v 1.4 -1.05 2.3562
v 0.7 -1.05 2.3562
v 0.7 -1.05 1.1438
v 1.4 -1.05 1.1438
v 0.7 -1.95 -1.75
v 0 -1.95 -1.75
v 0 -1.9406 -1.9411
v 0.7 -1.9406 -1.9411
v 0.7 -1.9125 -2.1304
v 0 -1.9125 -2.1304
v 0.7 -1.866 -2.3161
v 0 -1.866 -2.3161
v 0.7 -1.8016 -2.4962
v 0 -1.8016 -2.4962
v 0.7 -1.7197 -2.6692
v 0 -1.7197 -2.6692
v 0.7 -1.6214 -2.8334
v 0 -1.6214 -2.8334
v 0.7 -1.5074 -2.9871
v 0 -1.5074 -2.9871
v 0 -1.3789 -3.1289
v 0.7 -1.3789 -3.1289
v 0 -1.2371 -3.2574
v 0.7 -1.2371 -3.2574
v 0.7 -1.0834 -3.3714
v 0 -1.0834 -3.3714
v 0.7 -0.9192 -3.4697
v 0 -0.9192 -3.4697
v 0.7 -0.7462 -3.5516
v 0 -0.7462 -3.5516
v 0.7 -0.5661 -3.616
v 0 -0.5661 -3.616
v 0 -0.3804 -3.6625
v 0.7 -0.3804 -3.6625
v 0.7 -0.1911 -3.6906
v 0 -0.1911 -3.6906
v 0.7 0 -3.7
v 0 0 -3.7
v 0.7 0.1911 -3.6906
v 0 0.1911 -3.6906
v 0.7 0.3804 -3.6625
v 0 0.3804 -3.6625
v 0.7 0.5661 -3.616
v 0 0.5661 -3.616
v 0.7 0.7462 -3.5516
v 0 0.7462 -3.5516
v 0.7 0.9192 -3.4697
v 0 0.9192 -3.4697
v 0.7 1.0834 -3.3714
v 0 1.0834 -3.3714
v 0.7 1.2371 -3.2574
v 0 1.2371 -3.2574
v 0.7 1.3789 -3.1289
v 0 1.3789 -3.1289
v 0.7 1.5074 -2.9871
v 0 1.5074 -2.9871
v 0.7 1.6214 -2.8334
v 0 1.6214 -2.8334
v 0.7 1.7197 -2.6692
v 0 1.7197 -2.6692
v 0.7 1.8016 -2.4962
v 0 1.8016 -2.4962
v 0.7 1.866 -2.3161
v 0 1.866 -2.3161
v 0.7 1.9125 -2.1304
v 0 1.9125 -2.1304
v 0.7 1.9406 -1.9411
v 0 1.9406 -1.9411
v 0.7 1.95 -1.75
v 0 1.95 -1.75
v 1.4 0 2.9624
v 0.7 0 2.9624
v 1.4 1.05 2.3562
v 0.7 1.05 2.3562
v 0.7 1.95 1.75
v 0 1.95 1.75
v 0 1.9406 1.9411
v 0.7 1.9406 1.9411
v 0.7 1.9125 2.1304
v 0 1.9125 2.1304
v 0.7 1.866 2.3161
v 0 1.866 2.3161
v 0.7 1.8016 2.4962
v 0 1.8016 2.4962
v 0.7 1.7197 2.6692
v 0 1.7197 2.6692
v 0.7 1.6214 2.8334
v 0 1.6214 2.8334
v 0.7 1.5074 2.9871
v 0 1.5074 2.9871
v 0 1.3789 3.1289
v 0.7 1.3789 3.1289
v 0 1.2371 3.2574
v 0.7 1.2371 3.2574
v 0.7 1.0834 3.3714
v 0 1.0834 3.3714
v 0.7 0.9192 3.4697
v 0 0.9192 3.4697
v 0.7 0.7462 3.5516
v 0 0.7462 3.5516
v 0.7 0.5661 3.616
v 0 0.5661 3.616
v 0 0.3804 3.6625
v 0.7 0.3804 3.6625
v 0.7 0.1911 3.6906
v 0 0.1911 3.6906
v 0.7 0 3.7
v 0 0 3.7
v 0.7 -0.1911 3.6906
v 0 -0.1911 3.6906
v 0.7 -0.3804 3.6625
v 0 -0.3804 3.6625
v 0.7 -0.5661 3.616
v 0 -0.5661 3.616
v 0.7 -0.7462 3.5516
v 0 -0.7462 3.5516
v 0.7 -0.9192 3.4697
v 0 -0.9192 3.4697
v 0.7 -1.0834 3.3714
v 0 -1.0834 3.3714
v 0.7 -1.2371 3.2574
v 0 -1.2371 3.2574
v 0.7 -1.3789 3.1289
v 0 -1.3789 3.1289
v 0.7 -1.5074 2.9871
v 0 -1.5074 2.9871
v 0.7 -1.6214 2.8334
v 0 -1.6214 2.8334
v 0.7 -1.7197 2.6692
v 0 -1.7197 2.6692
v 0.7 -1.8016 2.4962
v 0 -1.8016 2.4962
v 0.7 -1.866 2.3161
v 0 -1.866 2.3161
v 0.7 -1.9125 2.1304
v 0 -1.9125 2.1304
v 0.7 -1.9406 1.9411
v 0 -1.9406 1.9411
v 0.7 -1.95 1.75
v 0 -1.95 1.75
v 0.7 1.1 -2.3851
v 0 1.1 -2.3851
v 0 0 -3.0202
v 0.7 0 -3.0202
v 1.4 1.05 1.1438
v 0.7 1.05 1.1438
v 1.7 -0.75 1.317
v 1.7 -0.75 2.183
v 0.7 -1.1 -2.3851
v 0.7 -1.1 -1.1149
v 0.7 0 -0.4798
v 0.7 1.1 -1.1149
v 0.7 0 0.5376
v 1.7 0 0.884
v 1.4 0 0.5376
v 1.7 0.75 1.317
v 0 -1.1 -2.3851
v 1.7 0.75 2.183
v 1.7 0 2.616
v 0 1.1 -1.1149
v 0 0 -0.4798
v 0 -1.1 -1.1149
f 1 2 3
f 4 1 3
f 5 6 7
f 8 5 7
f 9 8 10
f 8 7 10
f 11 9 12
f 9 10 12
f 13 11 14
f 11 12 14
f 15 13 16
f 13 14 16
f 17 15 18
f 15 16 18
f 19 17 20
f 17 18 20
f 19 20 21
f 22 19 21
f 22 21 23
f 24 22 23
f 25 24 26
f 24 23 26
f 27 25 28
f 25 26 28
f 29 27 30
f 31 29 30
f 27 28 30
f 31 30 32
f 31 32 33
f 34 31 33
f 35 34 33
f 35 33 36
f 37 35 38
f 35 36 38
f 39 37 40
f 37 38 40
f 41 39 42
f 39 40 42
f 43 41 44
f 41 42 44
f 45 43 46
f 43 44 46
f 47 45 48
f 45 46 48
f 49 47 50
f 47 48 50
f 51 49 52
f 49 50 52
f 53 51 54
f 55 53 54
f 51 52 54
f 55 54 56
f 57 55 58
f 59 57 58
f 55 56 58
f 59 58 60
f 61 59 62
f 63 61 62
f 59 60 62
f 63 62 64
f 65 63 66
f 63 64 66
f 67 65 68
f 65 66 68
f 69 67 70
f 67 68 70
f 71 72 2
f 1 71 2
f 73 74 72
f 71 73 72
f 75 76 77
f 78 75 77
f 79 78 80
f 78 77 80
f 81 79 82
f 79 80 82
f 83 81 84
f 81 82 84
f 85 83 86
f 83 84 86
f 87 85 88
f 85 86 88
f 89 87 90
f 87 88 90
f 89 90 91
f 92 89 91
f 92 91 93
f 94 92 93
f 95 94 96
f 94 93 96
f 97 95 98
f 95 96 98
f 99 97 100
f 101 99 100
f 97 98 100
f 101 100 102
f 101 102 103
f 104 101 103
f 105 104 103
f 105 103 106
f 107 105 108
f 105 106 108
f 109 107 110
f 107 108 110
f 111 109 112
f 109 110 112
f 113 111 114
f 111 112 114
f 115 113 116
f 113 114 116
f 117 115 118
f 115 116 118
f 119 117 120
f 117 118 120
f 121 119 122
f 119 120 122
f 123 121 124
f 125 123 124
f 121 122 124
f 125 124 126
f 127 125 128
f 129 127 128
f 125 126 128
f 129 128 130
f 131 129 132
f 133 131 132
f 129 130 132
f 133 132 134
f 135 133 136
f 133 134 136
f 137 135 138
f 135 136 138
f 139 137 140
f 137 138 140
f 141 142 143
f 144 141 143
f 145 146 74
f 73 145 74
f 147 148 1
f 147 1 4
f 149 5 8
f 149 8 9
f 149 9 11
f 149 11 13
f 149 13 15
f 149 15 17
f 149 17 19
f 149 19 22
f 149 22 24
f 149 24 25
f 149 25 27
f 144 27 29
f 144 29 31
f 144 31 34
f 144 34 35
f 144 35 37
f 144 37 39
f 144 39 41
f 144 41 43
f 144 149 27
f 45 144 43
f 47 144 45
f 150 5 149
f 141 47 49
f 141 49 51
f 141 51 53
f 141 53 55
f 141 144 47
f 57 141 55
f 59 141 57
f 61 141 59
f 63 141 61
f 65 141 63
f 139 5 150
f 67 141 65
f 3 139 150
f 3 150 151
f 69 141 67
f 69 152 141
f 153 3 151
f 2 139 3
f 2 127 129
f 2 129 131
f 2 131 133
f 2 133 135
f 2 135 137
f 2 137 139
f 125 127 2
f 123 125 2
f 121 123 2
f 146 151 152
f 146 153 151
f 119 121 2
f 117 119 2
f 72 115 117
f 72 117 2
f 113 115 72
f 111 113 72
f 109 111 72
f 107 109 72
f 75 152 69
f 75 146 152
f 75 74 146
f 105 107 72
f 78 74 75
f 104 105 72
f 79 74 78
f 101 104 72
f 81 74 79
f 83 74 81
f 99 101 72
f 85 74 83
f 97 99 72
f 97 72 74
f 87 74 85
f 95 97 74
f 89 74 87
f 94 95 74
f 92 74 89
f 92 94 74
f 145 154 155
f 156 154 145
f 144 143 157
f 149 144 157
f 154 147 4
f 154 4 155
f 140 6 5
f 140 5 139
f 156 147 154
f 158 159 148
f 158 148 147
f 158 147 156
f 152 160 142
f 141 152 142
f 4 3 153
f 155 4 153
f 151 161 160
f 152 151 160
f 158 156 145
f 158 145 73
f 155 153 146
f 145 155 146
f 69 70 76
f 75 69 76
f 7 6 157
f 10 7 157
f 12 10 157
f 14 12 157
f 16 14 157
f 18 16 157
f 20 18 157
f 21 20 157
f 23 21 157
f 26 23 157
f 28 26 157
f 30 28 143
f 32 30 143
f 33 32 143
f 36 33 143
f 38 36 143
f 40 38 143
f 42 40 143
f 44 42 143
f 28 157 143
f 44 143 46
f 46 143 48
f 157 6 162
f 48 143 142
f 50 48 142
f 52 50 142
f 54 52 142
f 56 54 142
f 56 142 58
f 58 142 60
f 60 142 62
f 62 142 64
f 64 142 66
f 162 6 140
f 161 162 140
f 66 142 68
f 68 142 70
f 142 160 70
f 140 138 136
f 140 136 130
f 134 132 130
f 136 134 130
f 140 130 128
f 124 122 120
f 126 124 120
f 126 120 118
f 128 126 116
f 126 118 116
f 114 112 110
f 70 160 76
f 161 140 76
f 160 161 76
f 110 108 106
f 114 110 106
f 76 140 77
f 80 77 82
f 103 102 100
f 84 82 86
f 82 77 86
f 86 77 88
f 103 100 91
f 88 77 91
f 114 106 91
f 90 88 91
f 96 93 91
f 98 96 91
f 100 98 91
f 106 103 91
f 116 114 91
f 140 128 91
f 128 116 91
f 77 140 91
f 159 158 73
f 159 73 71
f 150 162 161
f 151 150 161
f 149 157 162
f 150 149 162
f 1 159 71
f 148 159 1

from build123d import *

# Parameters (mm, degrees)
F0_W     = 3.9
F0_H     = 3.5
F1_DEPTH = 0.7
F3_DEPTH = 1
F4_SIZE  = 0.3
F6_DEPTH = 0.7


with BuildPart() as f1:
    # F0 (on Right) → F1 (new body)
    with BuildSketch(Plane.YZ):
        Rectangle(F0_W, F0_H)
        with BuildLine():
            Line((-1.95, 1.75), (1.95, 1.75))
            ThreePointArc((1.95, 1.75), (0, 3.7), (-1.95, 1.75))
        make_face()
        with BuildLine():
            ThreePointArc((-1.95, -1.75), (0, -3.7), (1.95, -1.75))
            Line((1.95, -1.75), (-1.95, -1.75))
        make_face()
    extrude(amount=F1_DEPTH)

    # F2 (on face) → F3 (join)
    with BuildSketch(Plane.YZ.offset(0.7)):
        Polygon((1.05, 1.143782), (1.05, 2.356218), (0, 2.962436), (-1.05, 2.356218), (-1.05, 1.143782), (0, 0.537564), align=None)
    extrude(amount=F3_DEPTH)

    # F4
    f4_edges = [f1.edges().sort_by_distance(p)[0] for p in [
        (1.7, -0.525, 2.659327),
        (1.7, 0.525, 2.659327),
        (1.7, 1.05, 1.75),
        (1.7, 0.525, 0.840673),
        (1.7, -0.525, 0.840673),
        (1.7, -1.05, 1.75),
    ]]
    chamfer(f4_edges, length=F4_SIZE)

    # F5 (on face) → F6 (cut, through all)
    with BuildSketch(Plane(origin=(0, 0, 0), x_dir=(0, -1, 0), z_dir=(-1, 0, 0))):
        Polygon((1.1, -2.385085), (1.1, -1.114915), (0, -0.479829), (-1.1, -1.114915), (-1.1, -2.385085), (0, -3.020171), align=None)
    extrude(amount=-F6_DEPTH, mode=Mode.SUBTRACT)


solid = f1.part
